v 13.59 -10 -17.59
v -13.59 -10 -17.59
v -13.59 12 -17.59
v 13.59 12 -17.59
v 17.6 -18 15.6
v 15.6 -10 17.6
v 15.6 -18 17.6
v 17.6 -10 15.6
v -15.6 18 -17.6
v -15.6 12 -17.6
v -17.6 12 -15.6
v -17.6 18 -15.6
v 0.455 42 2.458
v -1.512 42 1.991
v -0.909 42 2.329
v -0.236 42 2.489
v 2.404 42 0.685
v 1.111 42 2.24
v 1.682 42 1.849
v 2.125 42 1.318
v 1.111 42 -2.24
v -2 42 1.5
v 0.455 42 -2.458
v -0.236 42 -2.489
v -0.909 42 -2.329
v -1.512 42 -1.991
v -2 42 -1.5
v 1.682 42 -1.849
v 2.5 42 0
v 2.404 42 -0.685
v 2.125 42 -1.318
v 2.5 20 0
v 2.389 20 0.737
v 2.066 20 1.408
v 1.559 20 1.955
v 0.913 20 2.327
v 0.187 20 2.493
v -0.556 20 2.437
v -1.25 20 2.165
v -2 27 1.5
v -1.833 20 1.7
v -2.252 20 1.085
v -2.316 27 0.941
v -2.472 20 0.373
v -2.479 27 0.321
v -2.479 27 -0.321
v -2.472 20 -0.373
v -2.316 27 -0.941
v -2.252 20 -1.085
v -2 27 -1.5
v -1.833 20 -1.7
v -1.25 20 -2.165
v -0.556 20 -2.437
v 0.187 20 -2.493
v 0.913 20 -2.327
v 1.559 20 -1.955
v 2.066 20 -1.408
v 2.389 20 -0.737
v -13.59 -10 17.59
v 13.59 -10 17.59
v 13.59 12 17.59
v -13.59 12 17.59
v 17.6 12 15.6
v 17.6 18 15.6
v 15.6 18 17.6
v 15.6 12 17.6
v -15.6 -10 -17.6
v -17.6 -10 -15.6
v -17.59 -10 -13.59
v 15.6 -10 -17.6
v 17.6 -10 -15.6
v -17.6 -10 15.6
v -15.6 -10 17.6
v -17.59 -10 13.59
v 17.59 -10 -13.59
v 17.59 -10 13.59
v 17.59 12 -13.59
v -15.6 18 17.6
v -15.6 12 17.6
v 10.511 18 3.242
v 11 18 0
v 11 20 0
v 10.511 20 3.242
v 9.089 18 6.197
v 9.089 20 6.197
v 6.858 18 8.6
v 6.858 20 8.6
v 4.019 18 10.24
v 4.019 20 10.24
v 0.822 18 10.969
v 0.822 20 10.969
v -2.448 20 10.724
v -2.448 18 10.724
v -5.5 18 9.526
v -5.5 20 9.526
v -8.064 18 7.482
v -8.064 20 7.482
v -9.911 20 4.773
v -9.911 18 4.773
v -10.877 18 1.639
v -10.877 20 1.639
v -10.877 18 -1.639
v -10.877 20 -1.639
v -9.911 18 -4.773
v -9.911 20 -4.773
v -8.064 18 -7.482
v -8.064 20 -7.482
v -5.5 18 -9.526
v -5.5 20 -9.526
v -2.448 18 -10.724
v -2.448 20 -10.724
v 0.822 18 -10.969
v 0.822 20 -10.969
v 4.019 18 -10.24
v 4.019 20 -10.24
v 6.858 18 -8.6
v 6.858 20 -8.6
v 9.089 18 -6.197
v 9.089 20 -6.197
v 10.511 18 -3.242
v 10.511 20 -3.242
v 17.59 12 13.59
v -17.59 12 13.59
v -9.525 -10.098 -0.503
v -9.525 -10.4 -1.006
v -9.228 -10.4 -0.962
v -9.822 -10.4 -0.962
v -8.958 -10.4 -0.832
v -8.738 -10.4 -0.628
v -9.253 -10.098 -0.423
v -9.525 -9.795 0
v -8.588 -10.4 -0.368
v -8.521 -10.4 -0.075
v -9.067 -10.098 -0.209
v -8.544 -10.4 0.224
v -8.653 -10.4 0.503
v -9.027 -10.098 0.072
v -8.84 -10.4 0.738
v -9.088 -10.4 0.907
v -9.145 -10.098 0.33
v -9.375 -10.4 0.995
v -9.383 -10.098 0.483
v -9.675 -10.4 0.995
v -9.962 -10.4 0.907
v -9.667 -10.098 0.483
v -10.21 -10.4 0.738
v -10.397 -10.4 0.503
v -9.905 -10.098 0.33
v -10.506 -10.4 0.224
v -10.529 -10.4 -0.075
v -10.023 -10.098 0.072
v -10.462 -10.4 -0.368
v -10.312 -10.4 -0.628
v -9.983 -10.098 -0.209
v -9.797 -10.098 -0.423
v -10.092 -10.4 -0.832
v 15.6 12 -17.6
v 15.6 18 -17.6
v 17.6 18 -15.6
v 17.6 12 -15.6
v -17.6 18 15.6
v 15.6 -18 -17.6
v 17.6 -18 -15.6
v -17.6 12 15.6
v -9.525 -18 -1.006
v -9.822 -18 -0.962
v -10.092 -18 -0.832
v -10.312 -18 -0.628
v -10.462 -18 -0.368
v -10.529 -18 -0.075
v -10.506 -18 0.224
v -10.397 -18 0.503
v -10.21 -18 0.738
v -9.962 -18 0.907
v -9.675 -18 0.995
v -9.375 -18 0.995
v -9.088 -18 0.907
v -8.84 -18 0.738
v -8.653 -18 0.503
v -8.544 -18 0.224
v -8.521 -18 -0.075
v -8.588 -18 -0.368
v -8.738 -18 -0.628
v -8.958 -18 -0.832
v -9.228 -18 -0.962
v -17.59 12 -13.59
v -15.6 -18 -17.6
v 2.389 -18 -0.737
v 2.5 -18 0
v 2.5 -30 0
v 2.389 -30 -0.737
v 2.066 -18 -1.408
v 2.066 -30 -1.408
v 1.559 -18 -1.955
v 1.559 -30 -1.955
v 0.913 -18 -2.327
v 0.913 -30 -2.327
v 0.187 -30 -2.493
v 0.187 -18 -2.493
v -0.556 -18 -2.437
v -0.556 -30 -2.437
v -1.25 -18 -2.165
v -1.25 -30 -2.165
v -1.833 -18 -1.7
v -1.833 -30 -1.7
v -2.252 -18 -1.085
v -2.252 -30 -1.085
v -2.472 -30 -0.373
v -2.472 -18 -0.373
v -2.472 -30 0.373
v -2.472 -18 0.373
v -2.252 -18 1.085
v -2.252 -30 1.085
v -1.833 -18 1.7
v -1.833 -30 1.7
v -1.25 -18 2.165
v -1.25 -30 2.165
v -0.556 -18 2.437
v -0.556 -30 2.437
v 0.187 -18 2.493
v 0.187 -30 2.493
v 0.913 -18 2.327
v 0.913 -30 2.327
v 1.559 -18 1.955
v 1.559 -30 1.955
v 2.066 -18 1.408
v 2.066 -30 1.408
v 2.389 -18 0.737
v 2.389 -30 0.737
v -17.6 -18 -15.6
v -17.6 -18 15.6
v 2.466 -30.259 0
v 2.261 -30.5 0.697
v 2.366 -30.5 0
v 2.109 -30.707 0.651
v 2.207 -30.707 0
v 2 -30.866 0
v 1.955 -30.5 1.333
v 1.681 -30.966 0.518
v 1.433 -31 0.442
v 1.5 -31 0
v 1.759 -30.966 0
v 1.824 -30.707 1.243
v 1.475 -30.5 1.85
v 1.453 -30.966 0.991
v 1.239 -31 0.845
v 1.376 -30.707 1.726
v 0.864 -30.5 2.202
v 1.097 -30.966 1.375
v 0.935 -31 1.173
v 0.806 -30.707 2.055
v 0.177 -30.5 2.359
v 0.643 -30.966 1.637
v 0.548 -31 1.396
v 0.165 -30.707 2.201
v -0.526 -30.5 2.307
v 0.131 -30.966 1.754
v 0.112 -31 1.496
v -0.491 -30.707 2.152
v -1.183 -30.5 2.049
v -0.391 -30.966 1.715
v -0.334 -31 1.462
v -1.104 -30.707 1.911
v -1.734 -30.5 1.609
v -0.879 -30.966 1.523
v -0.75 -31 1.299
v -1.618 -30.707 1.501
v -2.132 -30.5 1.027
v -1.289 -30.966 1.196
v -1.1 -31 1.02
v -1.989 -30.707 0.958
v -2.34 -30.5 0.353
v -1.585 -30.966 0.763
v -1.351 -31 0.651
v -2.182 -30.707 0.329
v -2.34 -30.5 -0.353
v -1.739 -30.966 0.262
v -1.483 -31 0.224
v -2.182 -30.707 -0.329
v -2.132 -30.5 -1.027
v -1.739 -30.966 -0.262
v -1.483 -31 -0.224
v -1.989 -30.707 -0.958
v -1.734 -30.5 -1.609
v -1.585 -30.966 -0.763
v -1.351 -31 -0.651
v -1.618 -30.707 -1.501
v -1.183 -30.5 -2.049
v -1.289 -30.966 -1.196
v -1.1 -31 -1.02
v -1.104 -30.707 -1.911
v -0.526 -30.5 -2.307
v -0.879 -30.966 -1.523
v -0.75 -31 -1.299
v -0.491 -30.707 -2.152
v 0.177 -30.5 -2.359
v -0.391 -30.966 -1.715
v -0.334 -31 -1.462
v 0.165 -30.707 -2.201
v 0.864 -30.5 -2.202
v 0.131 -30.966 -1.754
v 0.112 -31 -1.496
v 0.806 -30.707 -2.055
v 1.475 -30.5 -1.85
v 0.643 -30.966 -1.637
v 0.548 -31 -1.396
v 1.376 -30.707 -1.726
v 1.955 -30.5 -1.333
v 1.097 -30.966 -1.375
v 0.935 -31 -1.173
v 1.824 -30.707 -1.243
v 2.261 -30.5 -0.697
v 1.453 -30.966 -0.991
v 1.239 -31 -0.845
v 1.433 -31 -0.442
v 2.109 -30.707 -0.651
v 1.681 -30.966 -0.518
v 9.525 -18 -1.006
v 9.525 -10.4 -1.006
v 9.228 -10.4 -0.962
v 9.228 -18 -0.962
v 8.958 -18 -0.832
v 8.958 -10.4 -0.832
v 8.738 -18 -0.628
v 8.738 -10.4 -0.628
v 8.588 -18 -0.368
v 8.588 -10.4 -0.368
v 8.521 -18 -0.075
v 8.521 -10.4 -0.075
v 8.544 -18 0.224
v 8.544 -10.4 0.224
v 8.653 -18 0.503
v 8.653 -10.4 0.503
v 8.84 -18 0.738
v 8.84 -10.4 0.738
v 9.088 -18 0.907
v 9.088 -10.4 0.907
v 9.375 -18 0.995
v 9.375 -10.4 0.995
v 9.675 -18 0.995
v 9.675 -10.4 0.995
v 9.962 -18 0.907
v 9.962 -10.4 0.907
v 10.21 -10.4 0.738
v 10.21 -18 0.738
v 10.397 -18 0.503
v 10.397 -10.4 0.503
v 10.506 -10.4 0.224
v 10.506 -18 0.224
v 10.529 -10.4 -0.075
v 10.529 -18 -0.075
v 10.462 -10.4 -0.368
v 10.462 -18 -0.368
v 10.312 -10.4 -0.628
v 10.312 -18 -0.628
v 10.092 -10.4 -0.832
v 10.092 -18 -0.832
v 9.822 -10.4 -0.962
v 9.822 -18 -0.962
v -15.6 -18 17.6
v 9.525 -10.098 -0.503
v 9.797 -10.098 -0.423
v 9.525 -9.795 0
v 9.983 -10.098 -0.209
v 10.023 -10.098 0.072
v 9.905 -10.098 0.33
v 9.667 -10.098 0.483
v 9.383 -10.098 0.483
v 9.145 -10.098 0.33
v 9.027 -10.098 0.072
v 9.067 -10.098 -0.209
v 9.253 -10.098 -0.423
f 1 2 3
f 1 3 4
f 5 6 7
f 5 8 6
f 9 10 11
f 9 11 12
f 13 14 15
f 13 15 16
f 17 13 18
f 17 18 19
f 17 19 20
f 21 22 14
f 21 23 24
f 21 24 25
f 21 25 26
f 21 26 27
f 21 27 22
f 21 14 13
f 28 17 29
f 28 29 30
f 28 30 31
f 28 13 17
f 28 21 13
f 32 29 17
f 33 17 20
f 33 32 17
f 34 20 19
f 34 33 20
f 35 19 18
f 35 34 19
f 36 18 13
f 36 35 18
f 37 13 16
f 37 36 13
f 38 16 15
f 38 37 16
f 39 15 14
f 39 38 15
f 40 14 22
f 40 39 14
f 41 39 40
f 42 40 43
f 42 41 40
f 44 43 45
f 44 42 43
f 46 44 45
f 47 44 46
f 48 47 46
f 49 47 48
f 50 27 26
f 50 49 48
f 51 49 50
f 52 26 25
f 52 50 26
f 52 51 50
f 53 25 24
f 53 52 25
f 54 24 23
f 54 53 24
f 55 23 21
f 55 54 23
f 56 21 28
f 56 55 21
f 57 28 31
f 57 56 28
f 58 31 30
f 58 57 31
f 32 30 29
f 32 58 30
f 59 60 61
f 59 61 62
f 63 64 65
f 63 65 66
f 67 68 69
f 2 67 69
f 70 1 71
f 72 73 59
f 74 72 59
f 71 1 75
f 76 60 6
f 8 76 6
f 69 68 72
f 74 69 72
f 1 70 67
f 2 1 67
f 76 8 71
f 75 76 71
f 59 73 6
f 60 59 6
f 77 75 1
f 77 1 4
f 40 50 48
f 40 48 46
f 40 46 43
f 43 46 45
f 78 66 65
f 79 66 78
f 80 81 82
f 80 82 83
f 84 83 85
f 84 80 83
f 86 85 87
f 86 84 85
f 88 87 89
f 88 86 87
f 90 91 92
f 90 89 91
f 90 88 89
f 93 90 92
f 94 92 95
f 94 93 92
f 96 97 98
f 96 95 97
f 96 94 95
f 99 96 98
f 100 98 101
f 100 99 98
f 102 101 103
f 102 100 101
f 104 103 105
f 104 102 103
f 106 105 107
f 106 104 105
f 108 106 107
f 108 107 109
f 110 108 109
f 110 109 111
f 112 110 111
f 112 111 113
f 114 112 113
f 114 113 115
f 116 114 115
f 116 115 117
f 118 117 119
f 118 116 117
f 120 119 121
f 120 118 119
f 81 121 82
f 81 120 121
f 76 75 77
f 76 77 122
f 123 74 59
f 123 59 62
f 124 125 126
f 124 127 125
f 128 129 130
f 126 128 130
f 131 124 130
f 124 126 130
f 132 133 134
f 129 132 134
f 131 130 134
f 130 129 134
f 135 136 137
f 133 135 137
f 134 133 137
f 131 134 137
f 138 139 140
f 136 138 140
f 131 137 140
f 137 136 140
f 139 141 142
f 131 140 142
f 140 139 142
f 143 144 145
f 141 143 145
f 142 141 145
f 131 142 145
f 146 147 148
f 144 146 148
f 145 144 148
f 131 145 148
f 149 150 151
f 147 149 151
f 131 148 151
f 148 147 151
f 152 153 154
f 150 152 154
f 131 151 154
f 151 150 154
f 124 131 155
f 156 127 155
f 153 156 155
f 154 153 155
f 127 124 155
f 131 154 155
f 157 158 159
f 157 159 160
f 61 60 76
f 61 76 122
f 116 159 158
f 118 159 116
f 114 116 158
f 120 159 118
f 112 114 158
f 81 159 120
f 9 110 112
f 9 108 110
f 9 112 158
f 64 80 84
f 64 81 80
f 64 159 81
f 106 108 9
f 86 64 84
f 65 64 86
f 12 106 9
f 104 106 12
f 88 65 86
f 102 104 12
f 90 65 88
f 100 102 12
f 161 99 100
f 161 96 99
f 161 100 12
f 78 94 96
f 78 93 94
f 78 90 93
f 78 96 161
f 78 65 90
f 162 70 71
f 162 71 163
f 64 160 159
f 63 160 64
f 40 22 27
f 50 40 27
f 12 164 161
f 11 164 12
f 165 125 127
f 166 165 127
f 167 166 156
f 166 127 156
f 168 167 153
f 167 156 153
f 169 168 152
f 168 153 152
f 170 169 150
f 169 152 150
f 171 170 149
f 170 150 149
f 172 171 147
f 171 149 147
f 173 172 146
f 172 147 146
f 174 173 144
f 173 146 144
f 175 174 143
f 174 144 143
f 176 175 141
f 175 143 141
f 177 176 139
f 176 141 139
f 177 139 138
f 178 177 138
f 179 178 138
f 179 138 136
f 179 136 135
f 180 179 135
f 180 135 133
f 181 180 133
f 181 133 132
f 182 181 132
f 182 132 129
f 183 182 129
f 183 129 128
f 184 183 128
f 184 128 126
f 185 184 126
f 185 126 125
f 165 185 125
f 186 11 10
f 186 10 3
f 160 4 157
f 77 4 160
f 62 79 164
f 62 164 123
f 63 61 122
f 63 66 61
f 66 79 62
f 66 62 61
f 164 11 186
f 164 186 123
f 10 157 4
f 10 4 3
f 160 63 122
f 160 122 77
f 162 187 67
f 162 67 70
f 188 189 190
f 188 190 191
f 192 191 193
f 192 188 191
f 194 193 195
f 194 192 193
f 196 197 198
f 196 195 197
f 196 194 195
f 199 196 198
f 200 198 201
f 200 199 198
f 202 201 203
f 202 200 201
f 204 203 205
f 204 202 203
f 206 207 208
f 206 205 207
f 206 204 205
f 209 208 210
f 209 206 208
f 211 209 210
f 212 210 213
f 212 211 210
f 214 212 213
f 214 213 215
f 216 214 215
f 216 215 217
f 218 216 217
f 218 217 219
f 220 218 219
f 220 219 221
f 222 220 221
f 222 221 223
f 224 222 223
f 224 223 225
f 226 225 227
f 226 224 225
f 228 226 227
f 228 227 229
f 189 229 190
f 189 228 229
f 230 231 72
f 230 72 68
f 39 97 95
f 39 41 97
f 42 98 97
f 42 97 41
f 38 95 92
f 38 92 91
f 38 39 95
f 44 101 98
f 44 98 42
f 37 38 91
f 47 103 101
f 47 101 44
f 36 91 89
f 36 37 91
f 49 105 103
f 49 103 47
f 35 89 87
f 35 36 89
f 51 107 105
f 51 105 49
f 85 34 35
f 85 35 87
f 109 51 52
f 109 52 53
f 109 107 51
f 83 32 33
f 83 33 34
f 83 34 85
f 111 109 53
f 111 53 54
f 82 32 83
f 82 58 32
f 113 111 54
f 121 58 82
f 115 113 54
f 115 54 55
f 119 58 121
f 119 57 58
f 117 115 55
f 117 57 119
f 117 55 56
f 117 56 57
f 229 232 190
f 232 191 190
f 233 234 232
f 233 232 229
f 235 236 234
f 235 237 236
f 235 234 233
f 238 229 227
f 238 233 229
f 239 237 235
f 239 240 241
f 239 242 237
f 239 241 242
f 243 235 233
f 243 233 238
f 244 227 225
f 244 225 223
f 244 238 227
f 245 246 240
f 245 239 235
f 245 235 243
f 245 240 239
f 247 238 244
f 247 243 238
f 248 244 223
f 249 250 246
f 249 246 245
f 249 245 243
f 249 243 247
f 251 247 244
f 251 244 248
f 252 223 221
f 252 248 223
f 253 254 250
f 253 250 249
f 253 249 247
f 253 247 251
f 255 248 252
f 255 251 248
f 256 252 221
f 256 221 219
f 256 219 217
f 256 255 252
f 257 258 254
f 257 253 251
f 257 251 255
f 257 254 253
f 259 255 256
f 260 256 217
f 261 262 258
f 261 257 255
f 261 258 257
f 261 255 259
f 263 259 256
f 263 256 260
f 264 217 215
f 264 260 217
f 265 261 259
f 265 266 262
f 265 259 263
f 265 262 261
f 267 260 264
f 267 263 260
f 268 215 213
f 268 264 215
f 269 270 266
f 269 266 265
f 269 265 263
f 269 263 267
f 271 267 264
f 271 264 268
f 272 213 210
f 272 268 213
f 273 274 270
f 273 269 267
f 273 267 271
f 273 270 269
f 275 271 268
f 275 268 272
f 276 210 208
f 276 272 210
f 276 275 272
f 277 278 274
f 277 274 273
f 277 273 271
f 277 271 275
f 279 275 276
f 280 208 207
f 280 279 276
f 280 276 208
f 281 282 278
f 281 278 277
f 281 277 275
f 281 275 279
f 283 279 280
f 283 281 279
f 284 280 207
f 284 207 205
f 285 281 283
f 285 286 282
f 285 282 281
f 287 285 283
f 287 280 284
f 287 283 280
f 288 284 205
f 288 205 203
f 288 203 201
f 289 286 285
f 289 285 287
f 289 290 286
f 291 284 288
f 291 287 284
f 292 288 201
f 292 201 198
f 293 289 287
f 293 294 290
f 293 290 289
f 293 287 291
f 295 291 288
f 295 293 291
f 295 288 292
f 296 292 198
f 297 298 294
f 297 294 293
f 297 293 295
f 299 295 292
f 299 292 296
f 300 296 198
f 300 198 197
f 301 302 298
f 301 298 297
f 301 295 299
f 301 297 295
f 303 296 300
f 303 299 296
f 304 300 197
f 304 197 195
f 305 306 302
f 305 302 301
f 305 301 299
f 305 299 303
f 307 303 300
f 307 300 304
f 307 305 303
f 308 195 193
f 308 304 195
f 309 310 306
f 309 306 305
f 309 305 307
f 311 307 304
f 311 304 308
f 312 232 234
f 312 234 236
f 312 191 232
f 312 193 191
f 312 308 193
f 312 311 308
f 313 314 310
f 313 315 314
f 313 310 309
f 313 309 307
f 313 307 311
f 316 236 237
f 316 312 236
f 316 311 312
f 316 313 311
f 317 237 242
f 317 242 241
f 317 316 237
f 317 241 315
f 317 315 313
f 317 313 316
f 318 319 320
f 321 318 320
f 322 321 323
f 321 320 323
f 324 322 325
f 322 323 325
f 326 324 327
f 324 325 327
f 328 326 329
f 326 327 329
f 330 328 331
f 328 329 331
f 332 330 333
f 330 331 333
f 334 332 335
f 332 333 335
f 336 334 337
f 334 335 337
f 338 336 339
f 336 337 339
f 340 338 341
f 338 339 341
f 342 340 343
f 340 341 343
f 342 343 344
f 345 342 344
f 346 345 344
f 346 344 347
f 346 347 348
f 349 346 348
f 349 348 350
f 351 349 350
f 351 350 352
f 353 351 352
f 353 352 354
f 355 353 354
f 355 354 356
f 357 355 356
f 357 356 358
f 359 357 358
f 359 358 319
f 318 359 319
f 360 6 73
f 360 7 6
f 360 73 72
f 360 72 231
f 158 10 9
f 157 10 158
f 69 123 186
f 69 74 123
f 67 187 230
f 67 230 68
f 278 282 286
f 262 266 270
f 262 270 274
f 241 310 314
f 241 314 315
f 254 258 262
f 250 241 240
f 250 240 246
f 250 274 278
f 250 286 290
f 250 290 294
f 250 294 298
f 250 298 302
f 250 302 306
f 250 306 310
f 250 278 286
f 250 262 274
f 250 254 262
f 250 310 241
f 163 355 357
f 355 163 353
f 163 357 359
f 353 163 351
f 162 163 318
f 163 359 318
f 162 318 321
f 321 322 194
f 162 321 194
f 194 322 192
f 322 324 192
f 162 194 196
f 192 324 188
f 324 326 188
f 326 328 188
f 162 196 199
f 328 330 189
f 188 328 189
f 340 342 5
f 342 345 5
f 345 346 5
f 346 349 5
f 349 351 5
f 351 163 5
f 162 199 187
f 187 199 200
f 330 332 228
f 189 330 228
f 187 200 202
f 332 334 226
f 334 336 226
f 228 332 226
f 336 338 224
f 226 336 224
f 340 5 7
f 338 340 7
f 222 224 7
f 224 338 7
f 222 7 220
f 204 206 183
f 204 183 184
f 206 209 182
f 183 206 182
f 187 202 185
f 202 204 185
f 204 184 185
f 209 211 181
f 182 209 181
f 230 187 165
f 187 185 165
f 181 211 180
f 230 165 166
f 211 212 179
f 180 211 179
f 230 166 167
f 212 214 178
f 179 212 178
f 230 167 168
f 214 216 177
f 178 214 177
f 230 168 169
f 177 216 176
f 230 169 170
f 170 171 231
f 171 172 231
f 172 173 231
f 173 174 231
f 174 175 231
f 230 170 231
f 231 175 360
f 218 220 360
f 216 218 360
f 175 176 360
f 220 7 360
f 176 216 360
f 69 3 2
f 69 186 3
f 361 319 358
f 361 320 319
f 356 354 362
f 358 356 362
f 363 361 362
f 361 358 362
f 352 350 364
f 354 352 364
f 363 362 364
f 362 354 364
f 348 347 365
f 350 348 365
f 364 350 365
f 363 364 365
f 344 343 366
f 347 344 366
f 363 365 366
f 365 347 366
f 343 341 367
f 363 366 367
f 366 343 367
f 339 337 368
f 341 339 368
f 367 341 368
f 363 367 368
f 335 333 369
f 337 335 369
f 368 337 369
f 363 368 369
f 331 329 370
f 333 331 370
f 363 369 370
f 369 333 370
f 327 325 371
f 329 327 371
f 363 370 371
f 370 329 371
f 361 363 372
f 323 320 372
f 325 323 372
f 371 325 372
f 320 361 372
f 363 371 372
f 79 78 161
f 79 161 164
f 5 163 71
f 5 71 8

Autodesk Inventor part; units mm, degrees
ref_plane "YZ Plane" through (0, 0, 0) normal (1, 0, 0) x (0, 1, 0)
sketch "Sketch1" plane through (0, 0, 0) normal (0, 1, 0) x (-1, 0, 0)
  line L0 (-17.6, 17.6) -> (17.6, 17.6)
  line L1 (17.6, 17.6) -> (17.6, -17.6)
  line L2 (17.6, -17.6) -> (-17.6, -17.6)
  line L3 (-17.6, -17.6) -> (-17.6, 17.6)
  line L4 (-17.6, 17.6) -> (17.6, -17.6) construction
  line L5 (17.6, 17.6) -> (-17.6, -17.6) construction
  point P0 (0, 0)
  dimension "d0" = 35.2
  dimension "d1" = 35.2
extrude "Extrusion1" add sketch "Sketch1" along normal mid plane 36
sketch "Sketch2" plane through (0, 18, 0) normal (0, 1, 0) x (1, 0, 0)
  circle A0 centre (0, 0) radius 11
  dimension "d4" = 22
extrude "Extrusion2" add sketch "Sketch2" along normal blind 2
sketch "Sketch3" plane through (0, 18, 0) normal (0, 1, 0) x (1, 0, 0)
  circle A0 centre (0, 0) radius 2.5
  dimension "d7" = 5
extrude "Extrusion3" add sketch "Sketch3" along normal blind 24
sketch "Sketch4" plane through (0, 42, 0) normal (0, 1, 0) x (1, 0, 0)
  circle A0 centre (0, 0) radius 2.5 projected
  line L0 (-2, -1.5) -> (-2, 1.5)
  circle A1 centre (0, 0) radius 2.5 projected
  dimension "d10" = 4.5
extrude "Extrusion4" cut sketch "Sketch4" against normal blind 15 contours L0 A0 picked at (-2.0912, -0.3466)
ref_plane "Work Plane2" through (0, 12, 0) normal (0, 1, 0) x (1, 0, 0)
ref_plane "Work Plane1" through (0, -10, 0) normal (0, -1, 0) x (1, 0, 0)
sketch "Sketch5" plane through (0, -10, 0) normal (0, -1, 0) x (1, 0, 0)
  line L0 (-17.6, -17.6) -> (17.6, -17.6) projected
  line L1 (17.6, -17.6) -> (17.6, 17.6) projected
  line L2 (17.6, 17.6) -> (-17.6, 17.6) projected
  line L3 (-17.6, 17.6) -> (-17.6, -17.6) projected
  line L4 (-17.59, -17.59) -> (17.59, -17.59)
  line L5 (17.59, -17.59) -> (17.59, 17.59)
  line L6 (17.59, 17.59) -> (-17.59, 17.59)
  line L7 (-17.59, 17.59) -> (-17.59, -17.59)
  point P0 (0, 0)
  dimension "d14" = 0.01
extrude "Extrusion5" cut sketch "Sketch5" against normal up to surface (22 mm away)
chamfer "Chamfer1" distance 4 angle 45 4 edges at (-17.59, 1, 17.59) (-17.59, 1, -17.59) (17.59, 1, 17.59) (17.59, 1, -17.59)
chamfer "Chamfer2" distance 2 angle 45 8 edges at (-17.6, 15, 17.6) (-17.6, -14, 17.6) (17.6, 15, 17.6) (17.6, -14, 17.6) (-17.6, -14, -17.6) (17.6, 15, -17.6) (17.6, -14, -17.6) (-17.6, 15, -17.6)
sketch "Sketch6" plane through (0, -18, 0) normal (0, -1, 0) x (1, 0, 0)
  circle A0 centre (0, 0) radius 2.5 projected
  circle A1 centre (0, 0) radius 2.5
  dimension "d24" = 5
extrude "Extrusion6" add sketch "Sketch6" along normal blind 13
fillet "Fillet1" radius 1 1 edges at (-2.5, -31, 0)
sketch "Sketch7" plane through (0, -18, 0) normal (0, -1, 0) x (1, 0, 0)
  circle A0 centre (0, 0) radius 1.5 projected
  circle A1 centre (0, 0) radius 9.525
  point P0 (-9.525, 0)
  point P1 (9.525, 0)
  dimension "d28" = 19.05
hole "Hole1" at (-9.525, -18, 0) at (9.525, -18, 0) direction (0, 1, 0) diameter 2.013 depth 7.6 tip angle 118 thread size "M2.5x0.45" class "6H" standard "ANSI Metric M Profile"
properties part number "NEMA_14_Dual_LM1048"
